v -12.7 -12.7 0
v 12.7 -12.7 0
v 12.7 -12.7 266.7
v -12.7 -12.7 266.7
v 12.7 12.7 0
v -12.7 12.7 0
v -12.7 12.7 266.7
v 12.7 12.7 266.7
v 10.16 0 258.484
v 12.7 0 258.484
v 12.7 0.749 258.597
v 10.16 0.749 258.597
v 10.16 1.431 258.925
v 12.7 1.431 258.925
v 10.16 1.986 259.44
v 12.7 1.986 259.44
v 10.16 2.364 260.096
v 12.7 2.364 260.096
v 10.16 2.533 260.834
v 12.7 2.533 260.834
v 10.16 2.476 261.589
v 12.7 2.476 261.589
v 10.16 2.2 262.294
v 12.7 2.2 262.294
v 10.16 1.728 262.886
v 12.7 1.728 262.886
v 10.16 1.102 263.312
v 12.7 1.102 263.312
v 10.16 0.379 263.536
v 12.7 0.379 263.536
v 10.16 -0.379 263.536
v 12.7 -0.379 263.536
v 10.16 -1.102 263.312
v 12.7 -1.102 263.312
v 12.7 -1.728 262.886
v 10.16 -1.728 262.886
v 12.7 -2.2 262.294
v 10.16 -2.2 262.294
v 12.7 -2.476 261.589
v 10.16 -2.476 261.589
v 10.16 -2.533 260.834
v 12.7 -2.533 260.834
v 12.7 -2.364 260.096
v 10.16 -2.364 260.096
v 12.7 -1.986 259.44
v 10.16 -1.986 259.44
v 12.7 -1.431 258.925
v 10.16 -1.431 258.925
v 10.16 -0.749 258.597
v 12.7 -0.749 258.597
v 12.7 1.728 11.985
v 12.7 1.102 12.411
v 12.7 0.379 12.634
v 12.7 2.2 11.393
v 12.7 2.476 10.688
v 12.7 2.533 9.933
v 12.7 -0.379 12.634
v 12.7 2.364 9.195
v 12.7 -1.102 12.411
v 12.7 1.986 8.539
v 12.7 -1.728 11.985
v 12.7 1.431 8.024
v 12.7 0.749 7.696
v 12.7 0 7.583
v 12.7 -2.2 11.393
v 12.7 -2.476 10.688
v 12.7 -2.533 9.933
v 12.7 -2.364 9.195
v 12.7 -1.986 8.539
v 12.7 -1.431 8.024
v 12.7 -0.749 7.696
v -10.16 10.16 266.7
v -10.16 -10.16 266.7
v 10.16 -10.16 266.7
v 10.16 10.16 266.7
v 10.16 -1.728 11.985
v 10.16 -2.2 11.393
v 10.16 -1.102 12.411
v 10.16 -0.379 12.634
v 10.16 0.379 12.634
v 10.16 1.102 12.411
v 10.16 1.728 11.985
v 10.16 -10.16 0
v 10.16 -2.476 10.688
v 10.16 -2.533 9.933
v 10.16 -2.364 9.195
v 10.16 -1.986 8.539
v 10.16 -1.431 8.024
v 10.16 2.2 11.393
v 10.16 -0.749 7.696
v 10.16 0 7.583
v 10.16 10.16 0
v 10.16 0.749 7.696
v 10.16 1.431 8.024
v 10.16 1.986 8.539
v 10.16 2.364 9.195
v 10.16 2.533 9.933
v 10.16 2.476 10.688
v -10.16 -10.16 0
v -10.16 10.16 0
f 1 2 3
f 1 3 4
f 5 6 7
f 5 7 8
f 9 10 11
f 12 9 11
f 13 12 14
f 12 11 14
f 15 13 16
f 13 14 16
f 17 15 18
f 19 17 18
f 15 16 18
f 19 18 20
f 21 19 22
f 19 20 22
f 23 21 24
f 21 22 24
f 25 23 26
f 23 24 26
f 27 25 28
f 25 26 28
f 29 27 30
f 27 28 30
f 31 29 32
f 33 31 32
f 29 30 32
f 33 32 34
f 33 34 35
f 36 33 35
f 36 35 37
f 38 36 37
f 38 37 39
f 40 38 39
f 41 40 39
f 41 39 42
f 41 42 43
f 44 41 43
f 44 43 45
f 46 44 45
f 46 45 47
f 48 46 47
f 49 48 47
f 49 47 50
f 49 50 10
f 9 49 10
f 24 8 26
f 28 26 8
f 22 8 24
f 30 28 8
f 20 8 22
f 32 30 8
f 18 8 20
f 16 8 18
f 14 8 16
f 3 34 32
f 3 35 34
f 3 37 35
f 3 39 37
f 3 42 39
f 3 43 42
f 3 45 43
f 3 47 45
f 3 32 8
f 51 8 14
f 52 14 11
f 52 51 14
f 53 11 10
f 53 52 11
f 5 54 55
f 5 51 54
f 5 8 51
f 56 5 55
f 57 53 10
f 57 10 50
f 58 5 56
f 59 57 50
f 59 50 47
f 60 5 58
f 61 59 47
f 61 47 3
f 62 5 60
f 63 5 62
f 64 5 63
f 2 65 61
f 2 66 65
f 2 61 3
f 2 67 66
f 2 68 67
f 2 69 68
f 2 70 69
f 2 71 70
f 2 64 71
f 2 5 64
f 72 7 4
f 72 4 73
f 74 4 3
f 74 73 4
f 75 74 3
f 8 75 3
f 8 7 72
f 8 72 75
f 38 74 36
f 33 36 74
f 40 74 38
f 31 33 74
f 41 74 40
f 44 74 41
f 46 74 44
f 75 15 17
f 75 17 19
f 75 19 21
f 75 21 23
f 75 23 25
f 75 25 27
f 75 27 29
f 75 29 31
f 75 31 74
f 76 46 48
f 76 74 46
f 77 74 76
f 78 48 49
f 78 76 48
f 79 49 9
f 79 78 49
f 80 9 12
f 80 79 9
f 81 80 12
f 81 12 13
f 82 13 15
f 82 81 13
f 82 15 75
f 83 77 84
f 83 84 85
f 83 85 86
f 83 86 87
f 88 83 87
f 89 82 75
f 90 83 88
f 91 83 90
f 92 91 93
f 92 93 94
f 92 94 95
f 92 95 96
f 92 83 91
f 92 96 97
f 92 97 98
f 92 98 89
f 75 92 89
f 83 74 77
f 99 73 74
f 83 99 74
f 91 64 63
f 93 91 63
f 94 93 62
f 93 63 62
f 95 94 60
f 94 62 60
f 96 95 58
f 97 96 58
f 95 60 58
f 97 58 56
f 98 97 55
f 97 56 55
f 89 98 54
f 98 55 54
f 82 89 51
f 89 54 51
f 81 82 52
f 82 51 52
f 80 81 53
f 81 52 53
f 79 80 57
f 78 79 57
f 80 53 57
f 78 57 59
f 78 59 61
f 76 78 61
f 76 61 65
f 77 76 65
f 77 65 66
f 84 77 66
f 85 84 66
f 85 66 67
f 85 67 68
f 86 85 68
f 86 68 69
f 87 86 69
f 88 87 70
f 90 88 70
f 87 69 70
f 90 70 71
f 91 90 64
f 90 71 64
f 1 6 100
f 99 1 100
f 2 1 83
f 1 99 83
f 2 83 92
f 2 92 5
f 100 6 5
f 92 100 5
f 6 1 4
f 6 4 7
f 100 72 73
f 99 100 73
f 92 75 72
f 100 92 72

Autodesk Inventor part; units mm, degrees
ref_plane "YZ Plane" through (0, 0, 0) normal (1, 0, 0) x (0, 1, 0)
ref_plane "XZ Plane" through (0, 0, 0) normal (0, 1, 0) x (-1, 0, 0)
ref_plane "XY Plane" through (0, 0, 0) normal (0, 0, 1) x (1, 0, 0)
sketch "Sketch1" plane through (0, 0, 0) normal (0, 0, 1) x (1, 0, 0)
  line L0 (12.7, -12.7) -> (-12.7, -12.7)
  line L1 (-12.7, -12.7) -> (-12.7, 12.7)
  line L2 (-12.7, 12.7) -> (12.7, 12.7)
  line L3 (12.7, 12.7) -> (12.7, -12.7)
  line L4 (12.7, -12.7) -> (-12.7, 12.7) construction
  line L5 (-12.7, -12.7) -> (12.7, 12.7) construction
  line L6 (10.16, 10.16) -> (-10.16, 10.16)
  line L7 (-10.16, 10.16) -> (-10.16, -10.16)
  line L8 (-10.16, -10.16) -> (10.16, -10.16)
  line L9 (10.16, -10.16) -> (10.16, 10.16)
  line L10 (10.16, 10.16) -> (-10.16, -10.16) construction
  line L11 (-10.16, 10.16) -> (10.16, -10.16) construction
  point P0 (0, 0)
  dimension "d0" = 25.4
  dimension "d1" = 25.4
  dimension "d2" = 2.54
  dimension "d3" = 2.54
extrude "Extrusion1" add sketch "Sketch1" along normal blind 266.7
sketch "Sketch2" plane through (12.7, -12.7, 0) normal (1, 0, 0) x (0, 0, -1)
  circle A0 centre (-10.1228, 12.7) radius 2.54
  circle A1 centre (-261.024, 12.7) radius 2.54
  line L0 (0, 25.4) -> (0, 0) projected
  line L1 (-266.7, 0) -> (-266.7, 25.4) projected
  line L2 (0, 0) -> (-266.7, 0) projected
  point P0 (0, 12.7)
  dimension "d6" = 250.9012
  dimension "d7" = 5.08
  dimension "d8" = 5.08
  dimension "d15" = 12.7
  dimension "d16" = 12.7
extrude "Extrusion2" cut sketch "Sketch2" against normal blind 2.54
equation "\"d3\" = d2"
equation "\"d8\" = d7"
properties part number "push bar"
